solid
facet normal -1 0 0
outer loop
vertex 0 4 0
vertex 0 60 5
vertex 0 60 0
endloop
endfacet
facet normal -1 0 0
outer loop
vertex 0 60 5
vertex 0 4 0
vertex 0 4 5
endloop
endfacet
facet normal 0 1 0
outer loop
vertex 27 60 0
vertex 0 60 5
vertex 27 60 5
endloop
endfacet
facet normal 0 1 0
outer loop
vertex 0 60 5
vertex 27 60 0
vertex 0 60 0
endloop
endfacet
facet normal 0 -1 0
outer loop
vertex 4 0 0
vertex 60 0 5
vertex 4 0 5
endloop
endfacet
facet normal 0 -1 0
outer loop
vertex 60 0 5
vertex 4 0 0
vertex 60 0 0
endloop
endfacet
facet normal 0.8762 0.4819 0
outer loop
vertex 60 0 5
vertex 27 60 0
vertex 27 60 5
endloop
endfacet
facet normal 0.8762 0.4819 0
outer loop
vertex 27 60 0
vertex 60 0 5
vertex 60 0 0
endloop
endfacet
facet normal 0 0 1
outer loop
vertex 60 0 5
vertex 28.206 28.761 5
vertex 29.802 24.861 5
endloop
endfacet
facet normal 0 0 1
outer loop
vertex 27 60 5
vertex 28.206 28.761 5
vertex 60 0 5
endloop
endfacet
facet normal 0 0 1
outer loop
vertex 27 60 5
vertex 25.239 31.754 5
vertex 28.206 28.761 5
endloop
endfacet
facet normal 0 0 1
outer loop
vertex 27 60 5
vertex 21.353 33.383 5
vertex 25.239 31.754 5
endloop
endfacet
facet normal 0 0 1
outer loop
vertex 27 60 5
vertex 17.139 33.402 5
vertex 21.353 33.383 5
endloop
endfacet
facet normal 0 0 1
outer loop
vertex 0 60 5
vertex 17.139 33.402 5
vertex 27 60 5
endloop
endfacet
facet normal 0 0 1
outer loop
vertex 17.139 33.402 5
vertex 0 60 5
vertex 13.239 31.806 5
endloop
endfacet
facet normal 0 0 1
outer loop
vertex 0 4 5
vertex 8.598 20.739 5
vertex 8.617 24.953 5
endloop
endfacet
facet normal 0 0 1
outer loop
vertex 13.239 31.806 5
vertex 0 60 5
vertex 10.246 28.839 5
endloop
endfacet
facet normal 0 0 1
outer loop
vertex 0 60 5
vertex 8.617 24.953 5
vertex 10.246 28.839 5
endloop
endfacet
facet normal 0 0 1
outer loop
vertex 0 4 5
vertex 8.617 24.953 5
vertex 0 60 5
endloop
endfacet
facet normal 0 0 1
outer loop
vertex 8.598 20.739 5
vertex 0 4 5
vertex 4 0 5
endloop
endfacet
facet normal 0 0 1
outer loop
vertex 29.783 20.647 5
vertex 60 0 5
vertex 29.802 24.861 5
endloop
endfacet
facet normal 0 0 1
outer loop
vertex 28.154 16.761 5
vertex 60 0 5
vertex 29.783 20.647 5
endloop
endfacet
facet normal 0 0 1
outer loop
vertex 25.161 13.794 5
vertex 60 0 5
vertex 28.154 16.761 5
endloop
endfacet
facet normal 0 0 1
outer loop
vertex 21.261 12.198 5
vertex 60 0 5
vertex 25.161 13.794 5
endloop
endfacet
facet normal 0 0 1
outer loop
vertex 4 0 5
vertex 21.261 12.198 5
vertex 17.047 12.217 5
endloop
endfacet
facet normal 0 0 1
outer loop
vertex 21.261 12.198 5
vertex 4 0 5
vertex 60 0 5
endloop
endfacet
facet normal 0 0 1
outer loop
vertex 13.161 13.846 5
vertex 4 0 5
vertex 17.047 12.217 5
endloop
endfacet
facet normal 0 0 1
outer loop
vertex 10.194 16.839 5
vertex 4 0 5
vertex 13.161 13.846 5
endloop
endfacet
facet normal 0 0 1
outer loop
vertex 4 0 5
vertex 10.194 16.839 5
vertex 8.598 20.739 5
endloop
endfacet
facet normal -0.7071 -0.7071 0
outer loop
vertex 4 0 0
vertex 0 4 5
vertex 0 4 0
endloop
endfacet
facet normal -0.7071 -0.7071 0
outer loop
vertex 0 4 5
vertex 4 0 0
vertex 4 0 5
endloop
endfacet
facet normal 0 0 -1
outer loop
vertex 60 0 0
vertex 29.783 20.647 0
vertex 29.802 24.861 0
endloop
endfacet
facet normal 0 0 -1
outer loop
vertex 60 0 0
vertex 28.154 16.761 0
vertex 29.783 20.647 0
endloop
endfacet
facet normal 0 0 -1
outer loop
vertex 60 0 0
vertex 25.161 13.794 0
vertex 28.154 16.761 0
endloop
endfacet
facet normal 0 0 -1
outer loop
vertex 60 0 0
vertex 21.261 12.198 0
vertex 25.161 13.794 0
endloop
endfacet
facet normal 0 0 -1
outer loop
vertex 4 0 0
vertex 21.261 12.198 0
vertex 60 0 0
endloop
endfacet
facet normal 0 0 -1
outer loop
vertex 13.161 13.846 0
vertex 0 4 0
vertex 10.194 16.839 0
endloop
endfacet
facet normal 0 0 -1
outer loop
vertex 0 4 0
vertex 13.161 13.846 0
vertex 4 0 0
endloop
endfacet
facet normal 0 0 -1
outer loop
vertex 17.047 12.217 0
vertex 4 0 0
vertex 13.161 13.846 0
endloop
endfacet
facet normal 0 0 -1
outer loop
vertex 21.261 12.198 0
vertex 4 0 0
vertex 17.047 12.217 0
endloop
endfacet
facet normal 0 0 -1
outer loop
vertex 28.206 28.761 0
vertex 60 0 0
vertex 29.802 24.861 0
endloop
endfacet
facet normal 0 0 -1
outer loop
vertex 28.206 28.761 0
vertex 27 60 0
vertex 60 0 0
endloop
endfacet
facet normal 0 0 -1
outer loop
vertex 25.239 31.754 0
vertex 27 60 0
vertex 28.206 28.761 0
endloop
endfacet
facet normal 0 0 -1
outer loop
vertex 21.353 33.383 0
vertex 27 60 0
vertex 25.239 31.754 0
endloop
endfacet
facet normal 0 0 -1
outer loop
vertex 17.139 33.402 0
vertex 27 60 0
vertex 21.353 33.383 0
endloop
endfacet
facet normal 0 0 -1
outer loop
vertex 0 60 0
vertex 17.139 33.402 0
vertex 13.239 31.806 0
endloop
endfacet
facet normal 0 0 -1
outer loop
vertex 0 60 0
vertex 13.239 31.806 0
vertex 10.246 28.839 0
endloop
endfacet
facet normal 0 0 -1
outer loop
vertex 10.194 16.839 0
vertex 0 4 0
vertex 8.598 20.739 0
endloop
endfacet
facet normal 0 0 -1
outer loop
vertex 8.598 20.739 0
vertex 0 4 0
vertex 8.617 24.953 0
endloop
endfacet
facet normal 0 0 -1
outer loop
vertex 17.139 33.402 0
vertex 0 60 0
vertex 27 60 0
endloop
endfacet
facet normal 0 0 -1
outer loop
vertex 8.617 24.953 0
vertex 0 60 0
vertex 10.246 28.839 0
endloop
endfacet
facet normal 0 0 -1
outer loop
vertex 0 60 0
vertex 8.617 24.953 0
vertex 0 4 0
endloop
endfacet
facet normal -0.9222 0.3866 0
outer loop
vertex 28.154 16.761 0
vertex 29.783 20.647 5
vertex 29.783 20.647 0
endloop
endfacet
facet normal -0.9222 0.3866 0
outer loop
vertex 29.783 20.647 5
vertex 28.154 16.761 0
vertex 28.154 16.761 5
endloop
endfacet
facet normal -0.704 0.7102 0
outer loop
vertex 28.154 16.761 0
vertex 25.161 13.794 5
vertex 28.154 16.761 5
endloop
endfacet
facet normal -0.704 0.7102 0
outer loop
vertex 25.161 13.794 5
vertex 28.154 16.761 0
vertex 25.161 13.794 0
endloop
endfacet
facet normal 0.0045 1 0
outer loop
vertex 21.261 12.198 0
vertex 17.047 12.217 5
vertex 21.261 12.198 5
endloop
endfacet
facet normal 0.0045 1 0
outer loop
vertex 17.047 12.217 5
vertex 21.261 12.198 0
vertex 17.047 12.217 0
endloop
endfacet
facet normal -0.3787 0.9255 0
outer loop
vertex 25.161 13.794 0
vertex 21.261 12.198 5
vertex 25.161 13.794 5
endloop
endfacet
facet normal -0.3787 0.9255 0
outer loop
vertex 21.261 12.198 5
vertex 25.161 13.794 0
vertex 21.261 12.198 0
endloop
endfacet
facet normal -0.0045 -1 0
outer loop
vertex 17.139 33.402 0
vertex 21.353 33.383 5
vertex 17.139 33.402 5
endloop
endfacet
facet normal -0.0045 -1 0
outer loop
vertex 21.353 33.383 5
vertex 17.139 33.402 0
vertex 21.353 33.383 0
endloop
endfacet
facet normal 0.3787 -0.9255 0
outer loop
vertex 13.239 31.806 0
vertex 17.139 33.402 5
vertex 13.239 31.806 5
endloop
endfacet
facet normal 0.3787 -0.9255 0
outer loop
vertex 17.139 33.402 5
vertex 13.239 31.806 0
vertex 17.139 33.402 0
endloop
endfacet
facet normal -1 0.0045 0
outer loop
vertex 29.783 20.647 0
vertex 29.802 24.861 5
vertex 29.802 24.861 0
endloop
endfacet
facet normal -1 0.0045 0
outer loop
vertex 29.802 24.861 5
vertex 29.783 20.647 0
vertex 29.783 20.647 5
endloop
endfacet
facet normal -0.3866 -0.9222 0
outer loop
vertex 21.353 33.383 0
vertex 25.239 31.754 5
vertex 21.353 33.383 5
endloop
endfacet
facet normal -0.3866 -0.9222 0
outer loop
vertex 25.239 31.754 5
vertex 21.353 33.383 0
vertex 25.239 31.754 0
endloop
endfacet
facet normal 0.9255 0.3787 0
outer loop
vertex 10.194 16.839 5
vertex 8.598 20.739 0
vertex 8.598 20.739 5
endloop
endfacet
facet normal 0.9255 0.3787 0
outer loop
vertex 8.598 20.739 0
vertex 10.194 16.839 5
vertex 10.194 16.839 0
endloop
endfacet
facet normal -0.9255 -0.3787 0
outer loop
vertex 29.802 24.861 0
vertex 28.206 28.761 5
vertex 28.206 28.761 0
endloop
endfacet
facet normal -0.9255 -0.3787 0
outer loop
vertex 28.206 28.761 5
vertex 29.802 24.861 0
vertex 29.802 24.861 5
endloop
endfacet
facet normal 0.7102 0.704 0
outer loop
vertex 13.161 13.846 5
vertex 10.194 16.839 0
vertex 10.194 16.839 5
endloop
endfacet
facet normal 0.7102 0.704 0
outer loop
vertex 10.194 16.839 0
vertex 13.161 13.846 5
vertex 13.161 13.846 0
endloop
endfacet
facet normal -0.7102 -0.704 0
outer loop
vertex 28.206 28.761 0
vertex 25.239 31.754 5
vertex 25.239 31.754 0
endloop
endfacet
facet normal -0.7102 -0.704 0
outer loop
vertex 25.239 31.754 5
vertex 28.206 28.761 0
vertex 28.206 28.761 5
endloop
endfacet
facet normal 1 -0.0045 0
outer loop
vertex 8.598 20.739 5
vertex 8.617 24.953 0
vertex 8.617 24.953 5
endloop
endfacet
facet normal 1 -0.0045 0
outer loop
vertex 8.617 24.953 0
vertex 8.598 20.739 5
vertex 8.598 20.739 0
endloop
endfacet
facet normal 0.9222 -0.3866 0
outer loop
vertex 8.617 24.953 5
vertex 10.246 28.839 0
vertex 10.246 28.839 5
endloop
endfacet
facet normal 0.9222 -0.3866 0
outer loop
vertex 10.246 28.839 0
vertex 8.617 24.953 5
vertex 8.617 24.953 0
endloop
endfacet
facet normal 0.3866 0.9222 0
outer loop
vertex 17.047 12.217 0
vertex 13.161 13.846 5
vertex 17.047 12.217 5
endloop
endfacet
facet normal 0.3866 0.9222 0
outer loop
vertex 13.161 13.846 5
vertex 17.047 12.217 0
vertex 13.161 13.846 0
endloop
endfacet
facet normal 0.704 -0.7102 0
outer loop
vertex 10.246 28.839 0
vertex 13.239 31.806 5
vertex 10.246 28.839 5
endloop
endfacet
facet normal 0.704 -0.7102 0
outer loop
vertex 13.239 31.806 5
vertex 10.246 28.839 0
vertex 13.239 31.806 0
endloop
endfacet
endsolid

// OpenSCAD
$fn = 32;

// ----------------------------------------------------------------------
// Bracket plate: gusset 60 x 60
// ----------------------------------------------------------------------

// --- parameters (mm) ---
hole_r = 4;               // bolt hole radius
plate_t = 5;              // plate thickness, Z (extrusion height)
gus_a = 60;               // base length
gus_b = 60;               // height
top_x = 27;               // top edge X of the angled cut
light_r = 10.8;           // lightening hole radius

light_d = 2 * light_r;

profile = [[4, 0], [30, 0], [60, 0], [27, 60], [0, 60], [0, 4]];  // primary outline, 6 points, counter clockwise
void_1 = [[29.802, 24.861], [28.206, 28.761], [25.239, 31.754], [21.353, 33.383], [17.139, 33.402], [13.239, 31.806], [10.246, 28.839], [8.617, 24.953], [8.598, 20.739], [10.194, 16.839], [13.161, 13.846], [17.047, 12.217], [21.261, 12.198], [25.161, 13.794], [28.154, 16.761], [29.783, 20.647]];  // lightening hole, 16 points

// --- the one profile operation ---
difference() {
  linear_extrude(height = plate_t) polygon(points = profile);
  translate([0, 0, -1])
    linear_extrude(height = plate_t + 2) polygon(points = void_1);
}
